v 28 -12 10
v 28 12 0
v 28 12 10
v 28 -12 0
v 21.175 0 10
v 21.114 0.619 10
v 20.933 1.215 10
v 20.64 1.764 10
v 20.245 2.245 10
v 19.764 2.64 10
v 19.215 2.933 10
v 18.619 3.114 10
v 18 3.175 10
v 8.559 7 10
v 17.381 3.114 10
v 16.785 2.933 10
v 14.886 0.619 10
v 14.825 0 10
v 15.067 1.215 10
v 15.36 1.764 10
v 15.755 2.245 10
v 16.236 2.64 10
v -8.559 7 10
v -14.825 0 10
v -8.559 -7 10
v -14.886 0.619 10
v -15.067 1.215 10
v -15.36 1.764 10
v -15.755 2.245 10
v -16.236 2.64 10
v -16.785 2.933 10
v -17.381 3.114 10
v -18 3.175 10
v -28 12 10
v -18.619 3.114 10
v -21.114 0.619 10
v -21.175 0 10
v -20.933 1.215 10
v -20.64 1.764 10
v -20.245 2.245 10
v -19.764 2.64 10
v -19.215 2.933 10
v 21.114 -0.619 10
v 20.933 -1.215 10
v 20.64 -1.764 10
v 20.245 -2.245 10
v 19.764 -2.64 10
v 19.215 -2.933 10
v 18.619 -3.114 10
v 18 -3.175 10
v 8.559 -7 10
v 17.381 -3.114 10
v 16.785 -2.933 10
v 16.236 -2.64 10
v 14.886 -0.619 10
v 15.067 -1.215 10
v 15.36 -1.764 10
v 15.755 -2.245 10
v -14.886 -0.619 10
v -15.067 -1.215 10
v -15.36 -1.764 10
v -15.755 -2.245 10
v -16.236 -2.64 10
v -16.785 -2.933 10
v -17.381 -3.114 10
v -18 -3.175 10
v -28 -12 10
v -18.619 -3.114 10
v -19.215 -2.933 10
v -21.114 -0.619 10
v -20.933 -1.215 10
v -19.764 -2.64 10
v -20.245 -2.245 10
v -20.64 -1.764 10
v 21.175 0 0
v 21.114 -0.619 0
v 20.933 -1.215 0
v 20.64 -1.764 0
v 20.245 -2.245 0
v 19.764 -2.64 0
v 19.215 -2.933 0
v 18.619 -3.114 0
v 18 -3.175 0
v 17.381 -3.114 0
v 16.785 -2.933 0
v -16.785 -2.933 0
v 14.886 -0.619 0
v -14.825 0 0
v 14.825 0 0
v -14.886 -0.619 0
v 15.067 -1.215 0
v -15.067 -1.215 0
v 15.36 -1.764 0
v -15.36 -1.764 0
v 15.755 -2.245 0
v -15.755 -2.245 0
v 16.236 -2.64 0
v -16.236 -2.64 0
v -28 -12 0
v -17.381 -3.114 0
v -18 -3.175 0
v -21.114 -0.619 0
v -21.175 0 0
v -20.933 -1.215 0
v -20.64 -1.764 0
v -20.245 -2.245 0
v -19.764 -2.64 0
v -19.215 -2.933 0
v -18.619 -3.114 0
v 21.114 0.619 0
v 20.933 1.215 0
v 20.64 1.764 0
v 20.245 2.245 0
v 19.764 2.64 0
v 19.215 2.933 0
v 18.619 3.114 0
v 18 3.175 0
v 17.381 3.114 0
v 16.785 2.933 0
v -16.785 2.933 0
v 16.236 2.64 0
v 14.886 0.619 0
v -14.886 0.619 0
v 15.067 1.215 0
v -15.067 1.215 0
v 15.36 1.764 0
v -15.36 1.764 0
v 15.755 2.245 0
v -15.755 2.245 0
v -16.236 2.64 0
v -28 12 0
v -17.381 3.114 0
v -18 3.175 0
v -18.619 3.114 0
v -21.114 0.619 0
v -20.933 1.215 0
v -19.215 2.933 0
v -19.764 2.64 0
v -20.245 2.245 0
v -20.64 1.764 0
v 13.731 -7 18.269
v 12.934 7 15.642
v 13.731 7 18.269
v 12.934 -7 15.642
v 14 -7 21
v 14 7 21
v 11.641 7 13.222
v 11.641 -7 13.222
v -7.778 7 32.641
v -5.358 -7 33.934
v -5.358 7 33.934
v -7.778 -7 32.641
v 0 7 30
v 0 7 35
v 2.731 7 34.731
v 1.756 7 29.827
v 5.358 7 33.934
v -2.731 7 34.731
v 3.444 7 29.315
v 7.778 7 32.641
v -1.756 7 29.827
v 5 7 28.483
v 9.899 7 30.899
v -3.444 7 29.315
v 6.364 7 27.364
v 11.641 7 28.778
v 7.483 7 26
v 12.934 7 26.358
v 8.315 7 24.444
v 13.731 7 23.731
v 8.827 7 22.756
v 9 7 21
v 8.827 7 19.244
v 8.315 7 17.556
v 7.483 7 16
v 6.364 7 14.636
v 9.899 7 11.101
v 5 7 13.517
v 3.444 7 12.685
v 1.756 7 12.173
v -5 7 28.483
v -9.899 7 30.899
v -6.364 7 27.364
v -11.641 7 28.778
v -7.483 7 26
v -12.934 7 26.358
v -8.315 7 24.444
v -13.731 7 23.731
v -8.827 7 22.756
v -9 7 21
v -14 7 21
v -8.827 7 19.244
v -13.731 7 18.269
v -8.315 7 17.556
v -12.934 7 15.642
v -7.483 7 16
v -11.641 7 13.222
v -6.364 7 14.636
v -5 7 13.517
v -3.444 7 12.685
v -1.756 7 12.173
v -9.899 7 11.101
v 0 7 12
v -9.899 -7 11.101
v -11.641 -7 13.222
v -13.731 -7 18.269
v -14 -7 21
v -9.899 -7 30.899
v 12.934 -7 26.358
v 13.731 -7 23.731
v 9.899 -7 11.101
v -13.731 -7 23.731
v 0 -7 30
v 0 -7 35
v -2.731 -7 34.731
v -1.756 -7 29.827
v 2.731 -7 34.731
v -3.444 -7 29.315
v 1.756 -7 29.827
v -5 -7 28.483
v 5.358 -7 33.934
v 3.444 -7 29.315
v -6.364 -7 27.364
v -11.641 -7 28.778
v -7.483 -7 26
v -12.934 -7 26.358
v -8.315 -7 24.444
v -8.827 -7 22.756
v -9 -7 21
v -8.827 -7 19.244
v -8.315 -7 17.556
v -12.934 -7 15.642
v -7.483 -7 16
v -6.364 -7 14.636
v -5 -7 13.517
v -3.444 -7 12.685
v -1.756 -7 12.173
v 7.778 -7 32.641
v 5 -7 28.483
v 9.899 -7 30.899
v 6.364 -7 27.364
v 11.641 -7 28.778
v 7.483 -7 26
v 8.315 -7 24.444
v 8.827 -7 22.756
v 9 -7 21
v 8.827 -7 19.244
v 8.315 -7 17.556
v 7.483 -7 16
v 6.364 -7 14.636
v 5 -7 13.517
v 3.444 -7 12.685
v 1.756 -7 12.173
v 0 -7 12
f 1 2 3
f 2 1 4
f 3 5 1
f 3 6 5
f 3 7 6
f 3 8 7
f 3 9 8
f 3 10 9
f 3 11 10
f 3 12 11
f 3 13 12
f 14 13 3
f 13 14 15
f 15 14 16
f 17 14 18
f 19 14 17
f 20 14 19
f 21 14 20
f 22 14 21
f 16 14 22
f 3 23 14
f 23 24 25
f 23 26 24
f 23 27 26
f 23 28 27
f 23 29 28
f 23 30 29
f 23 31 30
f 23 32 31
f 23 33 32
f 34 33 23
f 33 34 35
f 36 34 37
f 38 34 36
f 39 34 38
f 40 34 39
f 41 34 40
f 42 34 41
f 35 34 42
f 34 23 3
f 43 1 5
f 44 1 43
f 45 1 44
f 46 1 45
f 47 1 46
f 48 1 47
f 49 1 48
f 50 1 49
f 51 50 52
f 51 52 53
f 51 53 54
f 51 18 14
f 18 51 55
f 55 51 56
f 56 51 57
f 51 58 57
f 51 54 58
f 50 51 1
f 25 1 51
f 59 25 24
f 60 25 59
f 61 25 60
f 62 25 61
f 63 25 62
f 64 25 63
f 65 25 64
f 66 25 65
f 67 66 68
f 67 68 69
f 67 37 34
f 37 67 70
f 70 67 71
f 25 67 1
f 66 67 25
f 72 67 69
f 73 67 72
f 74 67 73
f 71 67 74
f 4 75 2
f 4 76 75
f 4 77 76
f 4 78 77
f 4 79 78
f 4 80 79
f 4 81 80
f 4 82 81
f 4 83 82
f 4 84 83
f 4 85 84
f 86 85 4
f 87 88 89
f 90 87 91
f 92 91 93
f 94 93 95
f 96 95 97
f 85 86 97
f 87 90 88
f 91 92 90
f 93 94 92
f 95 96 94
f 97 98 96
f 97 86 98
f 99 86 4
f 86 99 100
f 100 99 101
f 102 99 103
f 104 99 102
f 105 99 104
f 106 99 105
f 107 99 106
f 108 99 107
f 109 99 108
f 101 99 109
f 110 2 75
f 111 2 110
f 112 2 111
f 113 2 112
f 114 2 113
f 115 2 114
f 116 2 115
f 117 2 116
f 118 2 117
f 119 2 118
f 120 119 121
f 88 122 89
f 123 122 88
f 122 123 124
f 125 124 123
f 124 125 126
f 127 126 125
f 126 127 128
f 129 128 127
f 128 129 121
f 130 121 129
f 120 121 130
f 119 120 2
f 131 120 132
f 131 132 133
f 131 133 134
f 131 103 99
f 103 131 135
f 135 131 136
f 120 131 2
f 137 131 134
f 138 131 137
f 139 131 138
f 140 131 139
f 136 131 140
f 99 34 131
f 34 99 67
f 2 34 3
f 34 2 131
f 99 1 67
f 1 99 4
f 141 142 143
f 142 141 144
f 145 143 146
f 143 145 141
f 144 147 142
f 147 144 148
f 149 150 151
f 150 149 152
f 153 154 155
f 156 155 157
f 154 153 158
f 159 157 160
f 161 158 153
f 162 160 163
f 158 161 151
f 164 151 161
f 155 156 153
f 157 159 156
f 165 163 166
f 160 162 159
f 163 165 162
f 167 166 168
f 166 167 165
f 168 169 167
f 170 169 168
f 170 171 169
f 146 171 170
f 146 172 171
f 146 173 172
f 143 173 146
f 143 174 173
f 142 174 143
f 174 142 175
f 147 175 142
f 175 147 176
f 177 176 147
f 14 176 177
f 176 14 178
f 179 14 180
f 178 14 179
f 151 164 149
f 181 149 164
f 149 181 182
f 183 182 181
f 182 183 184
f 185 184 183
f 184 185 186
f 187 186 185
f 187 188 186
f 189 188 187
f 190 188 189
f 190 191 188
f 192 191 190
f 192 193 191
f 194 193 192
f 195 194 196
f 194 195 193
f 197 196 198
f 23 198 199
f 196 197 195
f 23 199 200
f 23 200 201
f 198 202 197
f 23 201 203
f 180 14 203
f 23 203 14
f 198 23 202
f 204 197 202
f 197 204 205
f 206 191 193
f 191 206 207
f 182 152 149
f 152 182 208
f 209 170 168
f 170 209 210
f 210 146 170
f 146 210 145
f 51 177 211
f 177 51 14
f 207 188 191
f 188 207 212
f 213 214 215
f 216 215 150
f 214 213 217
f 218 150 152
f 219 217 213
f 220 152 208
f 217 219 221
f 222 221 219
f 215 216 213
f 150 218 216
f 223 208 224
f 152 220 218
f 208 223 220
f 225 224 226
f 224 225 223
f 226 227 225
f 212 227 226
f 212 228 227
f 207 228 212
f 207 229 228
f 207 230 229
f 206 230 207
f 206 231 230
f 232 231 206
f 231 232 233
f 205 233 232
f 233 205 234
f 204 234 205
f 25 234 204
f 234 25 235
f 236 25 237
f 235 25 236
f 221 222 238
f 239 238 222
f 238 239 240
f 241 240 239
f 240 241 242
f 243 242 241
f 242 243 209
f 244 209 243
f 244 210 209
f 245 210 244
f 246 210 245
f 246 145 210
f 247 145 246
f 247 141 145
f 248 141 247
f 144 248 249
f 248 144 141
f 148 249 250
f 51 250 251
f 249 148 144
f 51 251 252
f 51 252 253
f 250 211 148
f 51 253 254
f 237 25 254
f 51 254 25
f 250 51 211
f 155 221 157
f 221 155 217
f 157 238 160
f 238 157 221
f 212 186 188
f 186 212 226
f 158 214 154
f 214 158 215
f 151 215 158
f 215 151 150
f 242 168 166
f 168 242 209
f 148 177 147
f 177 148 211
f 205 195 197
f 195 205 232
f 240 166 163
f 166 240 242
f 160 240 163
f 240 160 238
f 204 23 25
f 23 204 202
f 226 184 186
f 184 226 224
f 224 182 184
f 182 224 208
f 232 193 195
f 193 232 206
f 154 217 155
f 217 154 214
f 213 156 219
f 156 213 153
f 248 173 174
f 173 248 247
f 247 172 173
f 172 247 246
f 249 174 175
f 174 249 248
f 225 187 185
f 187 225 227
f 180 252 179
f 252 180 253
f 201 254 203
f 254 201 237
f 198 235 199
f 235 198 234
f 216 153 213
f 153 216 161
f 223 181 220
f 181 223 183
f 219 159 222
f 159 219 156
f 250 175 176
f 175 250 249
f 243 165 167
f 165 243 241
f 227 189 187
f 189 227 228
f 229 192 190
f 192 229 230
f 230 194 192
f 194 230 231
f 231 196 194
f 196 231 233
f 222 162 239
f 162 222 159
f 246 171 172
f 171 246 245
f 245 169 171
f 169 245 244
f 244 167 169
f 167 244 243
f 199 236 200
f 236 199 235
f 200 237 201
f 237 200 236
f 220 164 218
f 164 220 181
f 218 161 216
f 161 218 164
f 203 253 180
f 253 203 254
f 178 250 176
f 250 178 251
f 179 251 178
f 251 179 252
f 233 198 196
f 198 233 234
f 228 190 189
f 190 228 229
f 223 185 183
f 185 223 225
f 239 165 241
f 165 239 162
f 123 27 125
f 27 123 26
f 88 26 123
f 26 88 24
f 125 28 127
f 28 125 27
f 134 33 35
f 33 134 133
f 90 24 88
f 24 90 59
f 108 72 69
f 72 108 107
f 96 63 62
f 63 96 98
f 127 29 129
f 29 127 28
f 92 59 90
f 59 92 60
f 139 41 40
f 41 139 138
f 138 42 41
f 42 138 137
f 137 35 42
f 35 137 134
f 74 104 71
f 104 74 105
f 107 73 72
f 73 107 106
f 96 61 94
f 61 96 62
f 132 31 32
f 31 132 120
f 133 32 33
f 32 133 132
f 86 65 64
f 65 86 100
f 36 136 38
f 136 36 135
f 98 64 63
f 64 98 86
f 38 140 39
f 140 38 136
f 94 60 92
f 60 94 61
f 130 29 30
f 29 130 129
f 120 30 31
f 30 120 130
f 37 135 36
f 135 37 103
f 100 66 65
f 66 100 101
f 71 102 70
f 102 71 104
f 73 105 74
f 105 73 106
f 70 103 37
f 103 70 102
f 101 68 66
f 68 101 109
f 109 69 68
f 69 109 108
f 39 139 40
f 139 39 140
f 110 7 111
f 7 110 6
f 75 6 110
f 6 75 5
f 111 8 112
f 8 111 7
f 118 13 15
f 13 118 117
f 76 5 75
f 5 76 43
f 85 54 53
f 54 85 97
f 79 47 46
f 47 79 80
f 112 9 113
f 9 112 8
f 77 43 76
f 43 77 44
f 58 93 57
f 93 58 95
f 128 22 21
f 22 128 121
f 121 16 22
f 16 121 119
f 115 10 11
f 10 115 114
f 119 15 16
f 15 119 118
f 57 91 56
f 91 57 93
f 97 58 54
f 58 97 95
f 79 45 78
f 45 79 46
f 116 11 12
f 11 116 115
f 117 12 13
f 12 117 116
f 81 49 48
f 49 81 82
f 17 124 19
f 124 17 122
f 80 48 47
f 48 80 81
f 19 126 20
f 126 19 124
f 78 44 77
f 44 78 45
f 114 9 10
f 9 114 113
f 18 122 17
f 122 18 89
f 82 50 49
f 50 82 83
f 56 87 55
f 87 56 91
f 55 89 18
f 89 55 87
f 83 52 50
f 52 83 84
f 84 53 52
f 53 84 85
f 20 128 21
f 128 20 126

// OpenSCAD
$fn = 32;

// ----------------------------------------------------------------------
// Deck eye: 28 mm eye on a 56 mm base
// ----------------------------------------------------------------------

// --- parameters (mm) ---
base_l = 56;              // base length
base_w = 24;              // base width
base_t = 10;              // base thickness
eye_r = 14;               // eye outside radius
eye_bore = 18;            // eye bore diameter
eye_w = 14;               // eye thickness
eye_z = 21;               // eye centre height
holes_d = 6.35;           // fixing holes
hole_x = 18;              // fixing hole spacing

difference() {
  union() {
    translate([-28, -12, 0]) cube([base_l, base_w, base_t]);
    /* eye standing upright, its foot sunk 3 mm into the base */
    translate([0, -7, 21]) rotate([-90, 0, 0]) cylinder(h = 14, d = 28);
  }
  /* eye bore, 2.5 mm clear of both faces */
  translate([0, -9.5, 21]) rotate([-90, 0, 0]) cylinder(h = 19, d = 18);
  translate([-18, 0, -2.5]) cylinder(h = base_t + 5, d = holes_d);
  translate([18, 0, -2.5]) cylinder(h = base_t + 5, d = holes_d);
}
